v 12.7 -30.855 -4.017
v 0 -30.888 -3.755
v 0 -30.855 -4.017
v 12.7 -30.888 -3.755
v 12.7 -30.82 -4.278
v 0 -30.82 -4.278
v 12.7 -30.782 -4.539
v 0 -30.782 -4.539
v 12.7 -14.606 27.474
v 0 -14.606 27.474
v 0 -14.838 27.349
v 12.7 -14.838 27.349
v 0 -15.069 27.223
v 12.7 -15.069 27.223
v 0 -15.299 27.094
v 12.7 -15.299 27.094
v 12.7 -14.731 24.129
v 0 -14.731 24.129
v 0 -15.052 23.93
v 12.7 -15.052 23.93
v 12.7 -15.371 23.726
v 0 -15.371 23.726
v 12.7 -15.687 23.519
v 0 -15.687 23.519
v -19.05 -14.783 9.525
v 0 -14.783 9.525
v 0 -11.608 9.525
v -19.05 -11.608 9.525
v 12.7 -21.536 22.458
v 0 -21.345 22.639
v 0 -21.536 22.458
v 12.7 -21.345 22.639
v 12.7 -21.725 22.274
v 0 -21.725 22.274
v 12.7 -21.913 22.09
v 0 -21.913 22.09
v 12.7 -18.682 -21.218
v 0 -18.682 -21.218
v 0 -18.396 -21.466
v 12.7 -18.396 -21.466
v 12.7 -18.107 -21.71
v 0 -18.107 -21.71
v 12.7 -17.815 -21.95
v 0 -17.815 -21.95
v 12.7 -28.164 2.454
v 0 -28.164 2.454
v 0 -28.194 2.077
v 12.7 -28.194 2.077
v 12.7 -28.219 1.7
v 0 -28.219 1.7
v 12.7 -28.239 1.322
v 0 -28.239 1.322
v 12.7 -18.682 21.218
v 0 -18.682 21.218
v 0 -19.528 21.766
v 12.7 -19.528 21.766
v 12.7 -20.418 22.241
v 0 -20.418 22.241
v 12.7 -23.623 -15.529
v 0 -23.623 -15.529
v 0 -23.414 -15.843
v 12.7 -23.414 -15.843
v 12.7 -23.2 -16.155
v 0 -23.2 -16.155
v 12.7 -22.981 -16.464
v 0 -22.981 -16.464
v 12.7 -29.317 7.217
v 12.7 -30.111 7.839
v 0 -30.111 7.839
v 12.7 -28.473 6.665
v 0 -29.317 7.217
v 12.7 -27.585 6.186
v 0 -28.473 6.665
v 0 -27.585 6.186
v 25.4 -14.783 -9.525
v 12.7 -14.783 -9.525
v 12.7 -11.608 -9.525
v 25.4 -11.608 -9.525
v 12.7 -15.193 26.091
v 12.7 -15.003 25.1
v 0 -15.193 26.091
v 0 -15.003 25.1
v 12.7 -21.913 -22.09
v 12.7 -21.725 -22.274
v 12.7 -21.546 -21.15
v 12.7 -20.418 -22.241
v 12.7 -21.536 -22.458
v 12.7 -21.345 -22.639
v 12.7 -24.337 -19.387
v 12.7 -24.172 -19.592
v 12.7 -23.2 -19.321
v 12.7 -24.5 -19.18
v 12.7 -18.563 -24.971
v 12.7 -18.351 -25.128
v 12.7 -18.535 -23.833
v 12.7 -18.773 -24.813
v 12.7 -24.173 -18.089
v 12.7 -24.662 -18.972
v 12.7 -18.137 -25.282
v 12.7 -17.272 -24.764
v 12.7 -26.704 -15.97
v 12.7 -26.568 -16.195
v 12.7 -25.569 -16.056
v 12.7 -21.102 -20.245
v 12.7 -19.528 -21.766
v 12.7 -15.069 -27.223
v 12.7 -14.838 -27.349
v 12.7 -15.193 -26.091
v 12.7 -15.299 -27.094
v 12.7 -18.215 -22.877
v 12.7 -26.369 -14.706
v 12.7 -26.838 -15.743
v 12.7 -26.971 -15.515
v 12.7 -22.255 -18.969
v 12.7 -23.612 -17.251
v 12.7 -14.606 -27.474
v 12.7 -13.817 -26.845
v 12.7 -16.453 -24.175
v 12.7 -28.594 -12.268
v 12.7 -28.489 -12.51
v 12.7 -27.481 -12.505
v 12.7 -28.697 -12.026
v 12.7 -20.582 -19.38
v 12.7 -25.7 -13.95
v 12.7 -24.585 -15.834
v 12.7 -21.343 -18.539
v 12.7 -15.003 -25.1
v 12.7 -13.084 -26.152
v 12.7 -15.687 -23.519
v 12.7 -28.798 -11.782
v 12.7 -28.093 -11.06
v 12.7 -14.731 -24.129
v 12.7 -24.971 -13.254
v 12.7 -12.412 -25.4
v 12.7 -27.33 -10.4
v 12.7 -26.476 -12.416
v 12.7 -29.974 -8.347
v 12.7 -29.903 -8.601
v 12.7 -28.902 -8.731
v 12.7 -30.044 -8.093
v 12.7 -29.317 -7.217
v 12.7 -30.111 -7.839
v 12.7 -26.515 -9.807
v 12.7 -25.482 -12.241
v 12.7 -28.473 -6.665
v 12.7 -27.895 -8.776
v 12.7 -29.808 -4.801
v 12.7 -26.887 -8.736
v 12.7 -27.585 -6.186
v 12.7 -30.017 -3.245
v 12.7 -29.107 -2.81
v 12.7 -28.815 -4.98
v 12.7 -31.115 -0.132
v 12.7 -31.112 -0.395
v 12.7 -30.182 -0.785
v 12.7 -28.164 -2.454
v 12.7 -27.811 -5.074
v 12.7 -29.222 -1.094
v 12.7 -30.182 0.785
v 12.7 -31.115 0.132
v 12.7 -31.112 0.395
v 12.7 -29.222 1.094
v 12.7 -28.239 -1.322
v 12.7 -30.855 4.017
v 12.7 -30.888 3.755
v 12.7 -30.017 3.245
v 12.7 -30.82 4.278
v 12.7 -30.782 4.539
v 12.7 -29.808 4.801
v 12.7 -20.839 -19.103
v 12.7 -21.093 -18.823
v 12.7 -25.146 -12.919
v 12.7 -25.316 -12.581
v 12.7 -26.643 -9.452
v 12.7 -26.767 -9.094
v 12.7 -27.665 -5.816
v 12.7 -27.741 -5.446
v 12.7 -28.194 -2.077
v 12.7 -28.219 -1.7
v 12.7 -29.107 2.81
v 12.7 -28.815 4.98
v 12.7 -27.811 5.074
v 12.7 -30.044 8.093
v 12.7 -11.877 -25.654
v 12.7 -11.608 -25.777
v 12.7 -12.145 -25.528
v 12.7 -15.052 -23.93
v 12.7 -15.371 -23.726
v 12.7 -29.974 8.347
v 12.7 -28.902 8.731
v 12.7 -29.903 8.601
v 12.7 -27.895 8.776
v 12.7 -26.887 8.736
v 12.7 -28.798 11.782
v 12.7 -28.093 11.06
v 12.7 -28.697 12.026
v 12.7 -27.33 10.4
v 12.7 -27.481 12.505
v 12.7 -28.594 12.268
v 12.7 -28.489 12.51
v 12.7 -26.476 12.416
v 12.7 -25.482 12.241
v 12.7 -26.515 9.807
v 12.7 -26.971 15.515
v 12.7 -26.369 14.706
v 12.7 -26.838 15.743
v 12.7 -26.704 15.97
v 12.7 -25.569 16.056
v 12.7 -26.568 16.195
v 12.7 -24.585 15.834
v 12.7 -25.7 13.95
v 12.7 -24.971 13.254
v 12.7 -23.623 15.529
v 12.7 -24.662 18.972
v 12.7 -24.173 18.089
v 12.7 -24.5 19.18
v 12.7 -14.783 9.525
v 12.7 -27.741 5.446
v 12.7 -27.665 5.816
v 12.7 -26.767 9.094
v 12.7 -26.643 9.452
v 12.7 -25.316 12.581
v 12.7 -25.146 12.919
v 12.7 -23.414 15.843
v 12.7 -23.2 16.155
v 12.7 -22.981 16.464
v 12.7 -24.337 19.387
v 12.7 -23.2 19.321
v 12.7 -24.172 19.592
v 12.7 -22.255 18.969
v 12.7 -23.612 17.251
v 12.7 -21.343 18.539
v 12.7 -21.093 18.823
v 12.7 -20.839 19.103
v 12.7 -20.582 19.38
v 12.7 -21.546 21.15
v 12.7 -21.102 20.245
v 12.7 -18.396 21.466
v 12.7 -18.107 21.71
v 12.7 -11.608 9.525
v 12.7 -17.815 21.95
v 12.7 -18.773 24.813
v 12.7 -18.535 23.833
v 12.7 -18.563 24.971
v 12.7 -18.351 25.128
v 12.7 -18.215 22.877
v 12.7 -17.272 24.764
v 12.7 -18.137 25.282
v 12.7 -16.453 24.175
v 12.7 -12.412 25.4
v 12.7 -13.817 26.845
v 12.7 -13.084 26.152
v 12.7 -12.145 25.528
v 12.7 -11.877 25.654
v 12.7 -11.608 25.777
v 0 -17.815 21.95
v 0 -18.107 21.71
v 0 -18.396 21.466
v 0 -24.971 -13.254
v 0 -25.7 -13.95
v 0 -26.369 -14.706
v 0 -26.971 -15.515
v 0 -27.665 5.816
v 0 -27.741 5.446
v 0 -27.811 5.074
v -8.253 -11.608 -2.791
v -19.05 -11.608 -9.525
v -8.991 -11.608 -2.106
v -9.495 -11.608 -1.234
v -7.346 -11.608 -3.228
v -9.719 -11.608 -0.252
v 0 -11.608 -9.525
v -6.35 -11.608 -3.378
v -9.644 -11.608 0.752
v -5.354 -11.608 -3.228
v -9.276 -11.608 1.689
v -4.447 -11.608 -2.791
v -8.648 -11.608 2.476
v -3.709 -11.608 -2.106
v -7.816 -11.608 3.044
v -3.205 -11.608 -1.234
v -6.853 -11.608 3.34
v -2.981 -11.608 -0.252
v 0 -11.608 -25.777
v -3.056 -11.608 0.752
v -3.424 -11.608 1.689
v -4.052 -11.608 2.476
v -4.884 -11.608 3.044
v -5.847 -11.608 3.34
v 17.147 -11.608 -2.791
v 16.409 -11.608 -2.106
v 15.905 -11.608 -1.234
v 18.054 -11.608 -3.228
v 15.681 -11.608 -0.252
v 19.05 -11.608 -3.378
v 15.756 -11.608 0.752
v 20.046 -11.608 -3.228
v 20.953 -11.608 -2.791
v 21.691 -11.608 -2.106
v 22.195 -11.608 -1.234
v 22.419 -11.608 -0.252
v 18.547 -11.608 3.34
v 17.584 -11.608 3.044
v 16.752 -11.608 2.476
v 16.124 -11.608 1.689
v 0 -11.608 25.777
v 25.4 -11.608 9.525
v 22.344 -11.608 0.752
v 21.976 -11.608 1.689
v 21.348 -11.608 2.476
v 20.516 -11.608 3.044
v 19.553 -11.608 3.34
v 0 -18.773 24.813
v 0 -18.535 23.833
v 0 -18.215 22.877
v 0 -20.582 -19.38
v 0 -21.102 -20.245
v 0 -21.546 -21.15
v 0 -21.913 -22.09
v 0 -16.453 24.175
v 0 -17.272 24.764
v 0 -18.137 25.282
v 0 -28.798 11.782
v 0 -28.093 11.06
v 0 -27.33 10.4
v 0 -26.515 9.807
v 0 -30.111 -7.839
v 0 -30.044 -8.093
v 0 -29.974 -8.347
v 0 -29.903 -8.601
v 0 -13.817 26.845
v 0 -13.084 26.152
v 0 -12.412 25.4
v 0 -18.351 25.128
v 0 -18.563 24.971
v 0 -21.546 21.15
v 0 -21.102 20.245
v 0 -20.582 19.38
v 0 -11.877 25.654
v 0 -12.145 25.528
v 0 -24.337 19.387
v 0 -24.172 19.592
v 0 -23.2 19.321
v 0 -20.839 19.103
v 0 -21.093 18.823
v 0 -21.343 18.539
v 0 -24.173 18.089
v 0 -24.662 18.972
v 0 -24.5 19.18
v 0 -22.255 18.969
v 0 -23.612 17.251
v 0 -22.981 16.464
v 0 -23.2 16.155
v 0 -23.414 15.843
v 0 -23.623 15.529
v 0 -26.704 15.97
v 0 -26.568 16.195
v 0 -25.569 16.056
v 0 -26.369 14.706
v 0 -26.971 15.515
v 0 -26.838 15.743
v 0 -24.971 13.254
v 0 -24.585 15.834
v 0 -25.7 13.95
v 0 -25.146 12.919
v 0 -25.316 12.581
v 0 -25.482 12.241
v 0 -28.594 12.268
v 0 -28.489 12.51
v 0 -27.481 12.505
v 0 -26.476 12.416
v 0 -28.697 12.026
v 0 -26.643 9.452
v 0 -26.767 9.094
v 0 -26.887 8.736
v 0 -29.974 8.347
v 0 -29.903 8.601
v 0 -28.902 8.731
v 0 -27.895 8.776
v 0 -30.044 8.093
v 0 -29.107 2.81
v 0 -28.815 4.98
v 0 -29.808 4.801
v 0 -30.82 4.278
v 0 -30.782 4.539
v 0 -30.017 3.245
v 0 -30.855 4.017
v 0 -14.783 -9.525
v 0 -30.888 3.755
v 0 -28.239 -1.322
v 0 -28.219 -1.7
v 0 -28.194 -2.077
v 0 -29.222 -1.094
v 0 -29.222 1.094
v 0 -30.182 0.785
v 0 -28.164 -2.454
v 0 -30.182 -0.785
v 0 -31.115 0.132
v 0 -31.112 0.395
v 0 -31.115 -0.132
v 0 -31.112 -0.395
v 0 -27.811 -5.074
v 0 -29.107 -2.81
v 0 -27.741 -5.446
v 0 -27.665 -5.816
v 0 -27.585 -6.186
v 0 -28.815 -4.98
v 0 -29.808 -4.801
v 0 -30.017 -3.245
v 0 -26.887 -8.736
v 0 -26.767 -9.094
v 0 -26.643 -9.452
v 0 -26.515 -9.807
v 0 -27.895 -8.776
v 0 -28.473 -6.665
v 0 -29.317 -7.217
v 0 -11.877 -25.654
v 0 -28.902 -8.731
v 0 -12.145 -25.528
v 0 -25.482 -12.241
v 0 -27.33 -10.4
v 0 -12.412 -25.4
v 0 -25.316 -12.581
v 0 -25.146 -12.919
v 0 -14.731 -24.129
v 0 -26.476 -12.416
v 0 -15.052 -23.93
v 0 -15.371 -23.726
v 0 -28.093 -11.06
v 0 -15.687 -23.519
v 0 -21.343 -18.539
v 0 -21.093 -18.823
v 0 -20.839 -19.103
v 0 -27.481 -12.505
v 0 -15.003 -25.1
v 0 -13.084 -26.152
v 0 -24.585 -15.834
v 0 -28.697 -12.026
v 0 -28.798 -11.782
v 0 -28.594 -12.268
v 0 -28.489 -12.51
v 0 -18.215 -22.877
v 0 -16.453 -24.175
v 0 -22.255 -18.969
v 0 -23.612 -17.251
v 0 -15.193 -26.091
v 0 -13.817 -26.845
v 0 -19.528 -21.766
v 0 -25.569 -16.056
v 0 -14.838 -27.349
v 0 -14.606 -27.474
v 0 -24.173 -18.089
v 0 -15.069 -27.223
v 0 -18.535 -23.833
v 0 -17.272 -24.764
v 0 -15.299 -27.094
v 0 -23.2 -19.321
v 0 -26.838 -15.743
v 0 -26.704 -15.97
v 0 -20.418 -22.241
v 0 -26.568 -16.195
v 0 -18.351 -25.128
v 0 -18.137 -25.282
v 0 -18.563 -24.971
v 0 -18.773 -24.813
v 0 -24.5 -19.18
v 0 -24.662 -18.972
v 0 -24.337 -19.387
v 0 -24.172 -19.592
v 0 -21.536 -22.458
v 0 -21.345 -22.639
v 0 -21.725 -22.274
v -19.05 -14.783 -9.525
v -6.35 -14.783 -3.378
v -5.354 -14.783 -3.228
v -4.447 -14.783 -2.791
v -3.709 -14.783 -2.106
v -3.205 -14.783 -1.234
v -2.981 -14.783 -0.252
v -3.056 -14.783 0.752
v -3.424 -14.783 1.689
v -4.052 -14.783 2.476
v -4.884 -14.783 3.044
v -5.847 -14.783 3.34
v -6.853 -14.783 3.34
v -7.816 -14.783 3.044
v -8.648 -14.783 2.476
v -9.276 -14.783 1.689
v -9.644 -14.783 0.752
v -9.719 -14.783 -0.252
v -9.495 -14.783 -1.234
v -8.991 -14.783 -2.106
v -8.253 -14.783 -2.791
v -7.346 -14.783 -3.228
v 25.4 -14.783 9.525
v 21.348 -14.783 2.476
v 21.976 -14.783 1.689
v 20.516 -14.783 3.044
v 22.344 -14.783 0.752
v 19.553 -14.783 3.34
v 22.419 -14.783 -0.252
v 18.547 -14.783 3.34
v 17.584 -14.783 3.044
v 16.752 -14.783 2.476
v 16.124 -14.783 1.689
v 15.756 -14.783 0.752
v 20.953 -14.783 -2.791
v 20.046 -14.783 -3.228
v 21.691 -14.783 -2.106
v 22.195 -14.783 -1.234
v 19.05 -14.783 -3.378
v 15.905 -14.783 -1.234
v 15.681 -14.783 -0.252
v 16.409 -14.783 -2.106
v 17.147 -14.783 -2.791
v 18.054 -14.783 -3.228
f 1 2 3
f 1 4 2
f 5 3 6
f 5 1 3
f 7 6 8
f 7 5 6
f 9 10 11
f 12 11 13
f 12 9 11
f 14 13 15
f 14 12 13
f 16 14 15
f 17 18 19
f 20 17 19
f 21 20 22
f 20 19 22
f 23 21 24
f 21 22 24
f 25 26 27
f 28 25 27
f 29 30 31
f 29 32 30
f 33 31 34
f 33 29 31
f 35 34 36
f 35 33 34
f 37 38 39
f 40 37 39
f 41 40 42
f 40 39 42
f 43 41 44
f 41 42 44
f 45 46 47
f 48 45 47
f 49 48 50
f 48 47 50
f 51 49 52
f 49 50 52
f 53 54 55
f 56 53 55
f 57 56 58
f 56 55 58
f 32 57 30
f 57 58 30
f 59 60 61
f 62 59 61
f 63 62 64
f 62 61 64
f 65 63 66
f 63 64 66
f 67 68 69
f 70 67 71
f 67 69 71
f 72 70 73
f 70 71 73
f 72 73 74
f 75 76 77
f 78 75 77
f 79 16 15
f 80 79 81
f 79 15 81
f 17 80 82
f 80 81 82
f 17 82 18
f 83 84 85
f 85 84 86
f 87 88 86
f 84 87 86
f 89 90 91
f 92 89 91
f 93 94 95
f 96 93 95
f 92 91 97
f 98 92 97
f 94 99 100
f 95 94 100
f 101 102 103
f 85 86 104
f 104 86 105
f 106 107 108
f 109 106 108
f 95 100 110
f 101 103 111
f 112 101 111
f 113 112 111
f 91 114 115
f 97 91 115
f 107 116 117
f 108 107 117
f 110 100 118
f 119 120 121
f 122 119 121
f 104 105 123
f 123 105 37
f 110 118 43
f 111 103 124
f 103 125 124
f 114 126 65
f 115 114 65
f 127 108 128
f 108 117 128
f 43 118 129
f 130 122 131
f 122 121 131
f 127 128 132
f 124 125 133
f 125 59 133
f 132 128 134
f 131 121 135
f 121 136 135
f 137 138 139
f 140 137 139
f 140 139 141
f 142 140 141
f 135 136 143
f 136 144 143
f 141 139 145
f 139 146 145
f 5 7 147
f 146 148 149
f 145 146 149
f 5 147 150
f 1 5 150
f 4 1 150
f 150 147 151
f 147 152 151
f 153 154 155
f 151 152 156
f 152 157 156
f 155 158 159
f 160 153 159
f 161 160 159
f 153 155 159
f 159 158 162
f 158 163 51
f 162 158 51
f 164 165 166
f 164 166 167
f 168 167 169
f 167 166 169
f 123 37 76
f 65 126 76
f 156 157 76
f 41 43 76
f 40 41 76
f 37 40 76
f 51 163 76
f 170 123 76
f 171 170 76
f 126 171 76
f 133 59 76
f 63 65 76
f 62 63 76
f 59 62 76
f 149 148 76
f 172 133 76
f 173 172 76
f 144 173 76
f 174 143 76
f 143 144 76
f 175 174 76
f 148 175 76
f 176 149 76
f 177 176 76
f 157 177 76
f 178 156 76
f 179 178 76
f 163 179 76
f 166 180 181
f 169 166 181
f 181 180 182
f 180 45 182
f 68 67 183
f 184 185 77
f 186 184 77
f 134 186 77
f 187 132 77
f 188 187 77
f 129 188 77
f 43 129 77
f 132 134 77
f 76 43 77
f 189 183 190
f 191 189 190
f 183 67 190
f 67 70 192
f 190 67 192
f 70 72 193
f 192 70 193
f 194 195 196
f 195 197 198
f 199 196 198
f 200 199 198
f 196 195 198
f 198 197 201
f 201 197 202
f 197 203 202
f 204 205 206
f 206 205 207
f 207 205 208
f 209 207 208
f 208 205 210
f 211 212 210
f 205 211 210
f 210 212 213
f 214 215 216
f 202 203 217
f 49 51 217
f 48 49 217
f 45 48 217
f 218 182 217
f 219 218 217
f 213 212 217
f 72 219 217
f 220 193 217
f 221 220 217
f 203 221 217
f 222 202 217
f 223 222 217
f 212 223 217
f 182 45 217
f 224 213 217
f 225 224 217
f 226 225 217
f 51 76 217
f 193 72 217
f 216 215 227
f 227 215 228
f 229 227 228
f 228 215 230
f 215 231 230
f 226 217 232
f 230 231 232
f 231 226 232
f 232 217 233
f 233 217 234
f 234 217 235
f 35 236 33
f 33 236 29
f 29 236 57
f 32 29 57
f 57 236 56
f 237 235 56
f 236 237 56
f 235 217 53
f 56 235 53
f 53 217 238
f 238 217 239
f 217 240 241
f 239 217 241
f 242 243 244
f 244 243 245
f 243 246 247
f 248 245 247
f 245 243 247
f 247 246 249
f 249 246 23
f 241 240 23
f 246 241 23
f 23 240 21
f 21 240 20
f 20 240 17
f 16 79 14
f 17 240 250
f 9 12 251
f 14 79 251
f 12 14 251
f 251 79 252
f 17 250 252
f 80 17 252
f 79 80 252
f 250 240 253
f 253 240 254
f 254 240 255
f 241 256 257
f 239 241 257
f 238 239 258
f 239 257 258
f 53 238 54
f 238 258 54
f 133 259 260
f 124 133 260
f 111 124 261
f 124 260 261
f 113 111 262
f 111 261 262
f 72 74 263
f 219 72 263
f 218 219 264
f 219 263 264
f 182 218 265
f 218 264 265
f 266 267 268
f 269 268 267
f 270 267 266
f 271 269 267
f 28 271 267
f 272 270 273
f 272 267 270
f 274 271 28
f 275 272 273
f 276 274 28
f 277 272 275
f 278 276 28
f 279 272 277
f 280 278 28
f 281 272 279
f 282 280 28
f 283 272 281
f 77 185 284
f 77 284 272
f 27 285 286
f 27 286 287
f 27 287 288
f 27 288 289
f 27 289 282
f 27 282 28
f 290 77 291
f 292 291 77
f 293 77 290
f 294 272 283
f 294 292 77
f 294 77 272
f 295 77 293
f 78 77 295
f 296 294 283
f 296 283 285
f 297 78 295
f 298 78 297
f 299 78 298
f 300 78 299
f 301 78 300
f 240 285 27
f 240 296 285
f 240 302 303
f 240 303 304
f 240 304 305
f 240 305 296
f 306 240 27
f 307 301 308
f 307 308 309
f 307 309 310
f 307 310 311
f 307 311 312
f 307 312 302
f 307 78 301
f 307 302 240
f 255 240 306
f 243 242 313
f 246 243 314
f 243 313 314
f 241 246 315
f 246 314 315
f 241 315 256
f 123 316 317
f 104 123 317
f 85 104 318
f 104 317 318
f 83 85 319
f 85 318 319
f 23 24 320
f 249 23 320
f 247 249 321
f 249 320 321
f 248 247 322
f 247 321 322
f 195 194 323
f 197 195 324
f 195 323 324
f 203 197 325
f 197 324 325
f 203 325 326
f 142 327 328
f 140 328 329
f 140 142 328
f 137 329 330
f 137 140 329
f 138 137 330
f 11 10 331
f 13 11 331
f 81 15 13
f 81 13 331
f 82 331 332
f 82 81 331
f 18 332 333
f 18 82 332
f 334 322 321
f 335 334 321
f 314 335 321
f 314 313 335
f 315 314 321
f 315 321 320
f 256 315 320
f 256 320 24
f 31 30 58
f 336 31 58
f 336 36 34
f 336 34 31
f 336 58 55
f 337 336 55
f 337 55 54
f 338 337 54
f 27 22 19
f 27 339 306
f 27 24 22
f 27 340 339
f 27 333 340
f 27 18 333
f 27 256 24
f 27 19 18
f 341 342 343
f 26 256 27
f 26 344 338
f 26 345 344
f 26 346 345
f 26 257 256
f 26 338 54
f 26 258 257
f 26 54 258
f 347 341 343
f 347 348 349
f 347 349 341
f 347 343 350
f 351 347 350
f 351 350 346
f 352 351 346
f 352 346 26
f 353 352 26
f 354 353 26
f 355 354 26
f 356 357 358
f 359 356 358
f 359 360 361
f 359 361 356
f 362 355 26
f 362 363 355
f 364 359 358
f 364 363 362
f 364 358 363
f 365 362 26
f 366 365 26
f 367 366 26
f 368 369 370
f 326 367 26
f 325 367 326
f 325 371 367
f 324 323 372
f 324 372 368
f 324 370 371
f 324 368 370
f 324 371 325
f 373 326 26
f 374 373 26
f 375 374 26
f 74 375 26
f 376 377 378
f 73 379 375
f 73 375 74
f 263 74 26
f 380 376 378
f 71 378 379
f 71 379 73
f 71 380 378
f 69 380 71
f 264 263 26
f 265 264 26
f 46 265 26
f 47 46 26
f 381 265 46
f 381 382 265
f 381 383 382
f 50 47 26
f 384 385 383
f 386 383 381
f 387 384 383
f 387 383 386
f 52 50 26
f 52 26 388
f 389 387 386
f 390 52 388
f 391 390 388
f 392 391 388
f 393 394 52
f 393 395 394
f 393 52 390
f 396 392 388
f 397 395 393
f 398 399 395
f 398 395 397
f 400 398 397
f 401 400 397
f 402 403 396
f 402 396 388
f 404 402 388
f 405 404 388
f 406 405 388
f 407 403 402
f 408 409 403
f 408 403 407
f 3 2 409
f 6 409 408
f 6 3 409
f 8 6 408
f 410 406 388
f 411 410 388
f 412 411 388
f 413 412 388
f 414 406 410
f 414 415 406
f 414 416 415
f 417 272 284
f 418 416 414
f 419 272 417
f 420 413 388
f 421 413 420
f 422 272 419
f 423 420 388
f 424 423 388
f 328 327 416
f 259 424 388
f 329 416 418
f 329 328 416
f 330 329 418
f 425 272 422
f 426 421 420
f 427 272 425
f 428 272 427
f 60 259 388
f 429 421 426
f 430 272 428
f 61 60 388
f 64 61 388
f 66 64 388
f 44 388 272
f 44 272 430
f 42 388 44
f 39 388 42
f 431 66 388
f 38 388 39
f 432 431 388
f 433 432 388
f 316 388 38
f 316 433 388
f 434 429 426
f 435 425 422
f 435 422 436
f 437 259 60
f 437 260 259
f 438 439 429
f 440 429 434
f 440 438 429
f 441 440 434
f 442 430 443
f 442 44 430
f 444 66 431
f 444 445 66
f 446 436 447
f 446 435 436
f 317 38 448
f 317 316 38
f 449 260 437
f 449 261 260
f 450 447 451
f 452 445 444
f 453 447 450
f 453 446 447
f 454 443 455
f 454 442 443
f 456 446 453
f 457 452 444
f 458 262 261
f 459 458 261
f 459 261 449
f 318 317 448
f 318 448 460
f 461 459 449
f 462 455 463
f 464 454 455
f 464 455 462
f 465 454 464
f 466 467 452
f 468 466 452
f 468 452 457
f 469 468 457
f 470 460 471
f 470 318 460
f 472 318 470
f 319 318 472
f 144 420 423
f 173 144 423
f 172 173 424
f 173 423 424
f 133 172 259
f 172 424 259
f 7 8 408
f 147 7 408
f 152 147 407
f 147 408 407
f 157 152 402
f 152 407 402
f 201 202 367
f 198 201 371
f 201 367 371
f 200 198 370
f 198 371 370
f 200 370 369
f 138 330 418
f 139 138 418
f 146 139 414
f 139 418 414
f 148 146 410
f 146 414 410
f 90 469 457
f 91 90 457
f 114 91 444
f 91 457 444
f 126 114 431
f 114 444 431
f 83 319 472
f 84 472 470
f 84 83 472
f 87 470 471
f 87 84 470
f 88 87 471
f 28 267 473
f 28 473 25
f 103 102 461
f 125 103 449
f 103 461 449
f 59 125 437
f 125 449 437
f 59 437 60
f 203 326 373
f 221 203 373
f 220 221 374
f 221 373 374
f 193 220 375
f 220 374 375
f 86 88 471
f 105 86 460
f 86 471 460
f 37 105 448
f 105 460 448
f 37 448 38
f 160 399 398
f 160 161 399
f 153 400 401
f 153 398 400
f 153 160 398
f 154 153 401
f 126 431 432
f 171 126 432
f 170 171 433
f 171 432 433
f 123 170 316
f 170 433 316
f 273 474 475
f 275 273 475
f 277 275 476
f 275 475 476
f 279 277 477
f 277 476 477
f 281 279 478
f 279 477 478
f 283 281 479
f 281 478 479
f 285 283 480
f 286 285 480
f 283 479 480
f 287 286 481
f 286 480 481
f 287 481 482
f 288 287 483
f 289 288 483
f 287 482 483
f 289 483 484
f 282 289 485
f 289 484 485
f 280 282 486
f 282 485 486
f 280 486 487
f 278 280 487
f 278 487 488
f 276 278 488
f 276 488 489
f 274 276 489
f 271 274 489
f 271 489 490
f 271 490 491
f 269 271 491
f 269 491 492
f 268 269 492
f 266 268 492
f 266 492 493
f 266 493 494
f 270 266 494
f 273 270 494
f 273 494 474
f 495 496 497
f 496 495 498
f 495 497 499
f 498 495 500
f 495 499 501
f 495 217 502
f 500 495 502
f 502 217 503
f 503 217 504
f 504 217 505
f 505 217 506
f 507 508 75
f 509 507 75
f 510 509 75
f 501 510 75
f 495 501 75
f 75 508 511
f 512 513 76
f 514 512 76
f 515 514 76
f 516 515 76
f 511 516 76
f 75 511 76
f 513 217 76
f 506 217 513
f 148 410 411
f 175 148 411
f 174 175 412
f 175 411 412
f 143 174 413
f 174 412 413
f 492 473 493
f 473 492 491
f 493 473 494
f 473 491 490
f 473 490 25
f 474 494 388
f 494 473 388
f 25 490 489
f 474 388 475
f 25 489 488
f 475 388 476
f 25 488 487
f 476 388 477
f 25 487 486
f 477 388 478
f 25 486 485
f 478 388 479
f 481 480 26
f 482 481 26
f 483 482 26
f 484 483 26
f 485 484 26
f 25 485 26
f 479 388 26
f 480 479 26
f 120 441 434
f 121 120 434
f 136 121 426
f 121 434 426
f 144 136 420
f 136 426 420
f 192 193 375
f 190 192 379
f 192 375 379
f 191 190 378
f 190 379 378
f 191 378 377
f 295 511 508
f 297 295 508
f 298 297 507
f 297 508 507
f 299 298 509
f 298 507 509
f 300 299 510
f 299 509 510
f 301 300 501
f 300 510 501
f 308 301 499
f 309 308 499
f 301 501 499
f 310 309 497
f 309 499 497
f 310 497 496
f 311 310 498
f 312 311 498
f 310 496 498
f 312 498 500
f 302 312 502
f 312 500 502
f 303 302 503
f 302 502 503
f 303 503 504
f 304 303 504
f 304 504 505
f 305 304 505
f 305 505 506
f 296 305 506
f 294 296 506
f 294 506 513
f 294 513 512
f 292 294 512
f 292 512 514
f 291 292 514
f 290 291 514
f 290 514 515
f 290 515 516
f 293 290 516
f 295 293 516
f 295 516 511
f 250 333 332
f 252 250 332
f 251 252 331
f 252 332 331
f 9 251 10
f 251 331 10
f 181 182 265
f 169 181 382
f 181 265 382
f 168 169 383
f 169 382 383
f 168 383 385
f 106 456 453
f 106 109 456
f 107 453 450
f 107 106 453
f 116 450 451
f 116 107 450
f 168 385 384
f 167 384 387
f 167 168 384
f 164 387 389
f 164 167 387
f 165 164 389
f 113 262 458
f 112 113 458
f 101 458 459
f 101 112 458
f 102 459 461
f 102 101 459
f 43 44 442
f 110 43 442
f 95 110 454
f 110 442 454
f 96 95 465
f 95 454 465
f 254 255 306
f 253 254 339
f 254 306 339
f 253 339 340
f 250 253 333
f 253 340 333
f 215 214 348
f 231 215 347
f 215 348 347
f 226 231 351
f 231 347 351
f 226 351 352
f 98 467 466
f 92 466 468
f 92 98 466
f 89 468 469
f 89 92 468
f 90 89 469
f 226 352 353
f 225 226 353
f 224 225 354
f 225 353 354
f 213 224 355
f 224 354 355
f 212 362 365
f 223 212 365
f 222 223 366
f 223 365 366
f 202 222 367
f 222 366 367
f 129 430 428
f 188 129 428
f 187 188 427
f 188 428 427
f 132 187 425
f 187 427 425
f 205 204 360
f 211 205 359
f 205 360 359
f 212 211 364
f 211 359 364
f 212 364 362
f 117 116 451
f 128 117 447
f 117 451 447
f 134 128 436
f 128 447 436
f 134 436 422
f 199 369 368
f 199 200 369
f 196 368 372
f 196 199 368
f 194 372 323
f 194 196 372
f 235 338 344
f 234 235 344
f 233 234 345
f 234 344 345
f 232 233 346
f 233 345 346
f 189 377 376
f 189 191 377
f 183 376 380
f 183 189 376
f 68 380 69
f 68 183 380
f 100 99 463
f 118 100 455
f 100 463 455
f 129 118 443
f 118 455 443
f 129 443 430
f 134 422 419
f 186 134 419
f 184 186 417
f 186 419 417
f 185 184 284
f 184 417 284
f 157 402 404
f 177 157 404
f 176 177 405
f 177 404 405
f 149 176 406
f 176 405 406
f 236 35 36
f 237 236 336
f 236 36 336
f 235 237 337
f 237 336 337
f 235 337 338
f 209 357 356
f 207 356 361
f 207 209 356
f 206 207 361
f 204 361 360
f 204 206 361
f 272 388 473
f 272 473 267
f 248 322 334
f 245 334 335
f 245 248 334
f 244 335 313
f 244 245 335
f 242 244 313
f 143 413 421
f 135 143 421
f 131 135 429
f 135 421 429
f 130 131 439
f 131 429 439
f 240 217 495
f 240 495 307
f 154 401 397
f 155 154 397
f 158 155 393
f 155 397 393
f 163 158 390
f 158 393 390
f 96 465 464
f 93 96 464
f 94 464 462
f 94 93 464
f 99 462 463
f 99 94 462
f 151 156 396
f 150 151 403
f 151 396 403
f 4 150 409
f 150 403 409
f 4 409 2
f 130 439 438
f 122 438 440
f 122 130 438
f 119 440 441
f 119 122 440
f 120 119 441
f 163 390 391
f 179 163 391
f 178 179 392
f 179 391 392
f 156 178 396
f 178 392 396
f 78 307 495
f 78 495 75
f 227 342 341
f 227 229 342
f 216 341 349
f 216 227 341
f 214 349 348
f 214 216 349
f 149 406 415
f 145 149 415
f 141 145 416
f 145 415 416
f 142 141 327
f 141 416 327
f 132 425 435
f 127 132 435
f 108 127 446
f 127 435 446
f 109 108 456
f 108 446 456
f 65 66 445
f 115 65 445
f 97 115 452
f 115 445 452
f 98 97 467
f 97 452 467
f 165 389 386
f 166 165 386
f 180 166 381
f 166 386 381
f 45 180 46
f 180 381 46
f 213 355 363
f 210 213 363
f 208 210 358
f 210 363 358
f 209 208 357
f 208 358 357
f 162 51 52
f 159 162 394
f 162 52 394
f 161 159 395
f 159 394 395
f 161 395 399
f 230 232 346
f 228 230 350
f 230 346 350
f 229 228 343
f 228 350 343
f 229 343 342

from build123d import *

# Parameters (mm, degrees)
BASPROSKE_W              = 12.7
BASPROSKE_H              = 31.115
TOOTHCUT_DEPTH           = 46.799306217
TEETHCUTS_COUNT          = 47
TEETHCUTS_ANGLE          = 352.340425532
BORSKE_R                 = 1.5875
BORE_DEPTH               = 50.8000508
CUT_EXTRUDE2_DEPTH       = 46.794769115
BOSS_EXTRUDE1_DEPTH      = 19.05
BOSS_EXTRUDE1_DEPTH_BACK = 12.7
SKETCH2_W                = 19.05
SKETCH2_H                = 3.175
SKETCH4_W                = 19.05
SKETCH4_H                = 3.175
BOSS_EXTRUDE2_DEPTH      = 12.7
F_1_4_CLEARANCE_HOLE1_D  = 6.7564


with BuildPart() as part:
    # BasProSke → Base-Revolve (revolve)
    with BuildSketch(Plane(origin=(0, 0, 0), x_dir=(1, 0, 0), z_dir=(0, 1, 0)), mode=Mode.PRIVATE) as base_revolve_sk:
        with Locations((6.35, 15.5575)):
            Rectangle(BASPROSKE_W, BASPROSKE_H)
    revolve(base_revolve_sk.sketch.rotate(Axis((-10, 0, 0), (1, 0, 0)), 180), axis=Axis((-10, 0, 0), (1, 0, 0)))

    # TooCutSke → ToothCut (cut, through all)
    with BuildSketch(Plane(origin=(0, 0, 0), x_dir=(0, 0, -1), z_dir=(1, 0, 0))):
        with BuildLine():
            ThreePointArc((0.567219539, 28.264509018), (0, 28.2702), (-0.567219539, 28.264509018))
            ThreePointArc((-0.567219539, 28.264509018), (-1.041703705, 29.715512743), (-1.697480705, 31.094100267))
            ThreePointArc((-1.697480705, 31.094100267), (0, 31.1404), (1.697480705, 31.094100267))
            ThreePointArc((1.697480705, 31.094100267), (1.041703705, 29.715512743), (0.567219539, 28.264509018))
        make_face()
    toothcut = extrude(amount=TOOTHCUT_DEPTH, mode=Mode.SUBTRACT)

    # TeethCuts: ToothCut ×47 about axis
    teethcuts_axis = Axis((-10, 0, 0), (1, 0, 0))
    for i in range(1, TEETHCUTS_COUNT):
        add(toothcut.rotate(teethcuts_axis, i * TEETHCUTS_ANGLE / (TEETHCUTS_COUNT - 1)), mode=Mode.SUBTRACT)

    # BorSke → Bore (cut, symmetric)
    with BuildSketch(Plane(origin=(0, 0, 0), x_dir=(0, 0, -1), z_dir=(1, 0, 0))):
        with Locations(Location((0, 0, 0), (0, 0, 180))):
            Circle(BORSKE_R)
    extrude(amount=BORE_DEPTH, both=True, mode=Mode.SUBTRACT)

    # Sketch1 → Cut-Extrude2 (cut, through all)
    with BuildSketch(Plane(origin=(12.7, 0, 0), x_dir=(0, 0, -1), z_dir=(1, 0, 0))):
        with BuildLine():
            Line((28.868706313, -11.6078), (-28.868706313, -11.6078))
            ThreePointArc((-28.868706313, -11.6078), (0, 31.115), (28.868706313, -11.6078))
        make_face()
    extrude(amount=-CUT_EXTRUDE2_DEPTH, mode=Mode.SUBTRACT)

    # Sketch2 → Boss-Extrude1 (add, two sides: drawn at the far end of the back side and taken through both)
    with BuildSketch(Plane.ZY.offset(-BOSS_EXTRUDE1_DEPTH_BACK)):
        with Locations((0, -13.1953)):
            Rectangle(SKETCH2_W, SKETCH2_H)
    extrude(amount=BOSS_EXTRUDE1_DEPTH + BOSS_EXTRUDE1_DEPTH_BACK)

    # Sketch4 → Boss-Extrude2 (add)
    with BuildSketch(Plane(origin=(12.7, 0, 0), x_dir=(0, 0, -1), z_dir=(1, 0, 0))):
        with Locations((0, -13.1953)):
            Rectangle(SKETCH4_W, SKETCH4_H)
    extrude(amount=BOSS_EXTRUDE2_DEPTH)

    # 1/4 Clearance Hole1 (through all)
    with Locations(Plane(origin=(19.05, -11.6078, 0), x_dir=(0, 0, 1), z_dir=(0, 1, 0))):
        with Locations((0, 0), (0, -25.4)):
            Hole(F_1_4_CLEARANCE_HOLE1_D / 2)


solid = part.part
